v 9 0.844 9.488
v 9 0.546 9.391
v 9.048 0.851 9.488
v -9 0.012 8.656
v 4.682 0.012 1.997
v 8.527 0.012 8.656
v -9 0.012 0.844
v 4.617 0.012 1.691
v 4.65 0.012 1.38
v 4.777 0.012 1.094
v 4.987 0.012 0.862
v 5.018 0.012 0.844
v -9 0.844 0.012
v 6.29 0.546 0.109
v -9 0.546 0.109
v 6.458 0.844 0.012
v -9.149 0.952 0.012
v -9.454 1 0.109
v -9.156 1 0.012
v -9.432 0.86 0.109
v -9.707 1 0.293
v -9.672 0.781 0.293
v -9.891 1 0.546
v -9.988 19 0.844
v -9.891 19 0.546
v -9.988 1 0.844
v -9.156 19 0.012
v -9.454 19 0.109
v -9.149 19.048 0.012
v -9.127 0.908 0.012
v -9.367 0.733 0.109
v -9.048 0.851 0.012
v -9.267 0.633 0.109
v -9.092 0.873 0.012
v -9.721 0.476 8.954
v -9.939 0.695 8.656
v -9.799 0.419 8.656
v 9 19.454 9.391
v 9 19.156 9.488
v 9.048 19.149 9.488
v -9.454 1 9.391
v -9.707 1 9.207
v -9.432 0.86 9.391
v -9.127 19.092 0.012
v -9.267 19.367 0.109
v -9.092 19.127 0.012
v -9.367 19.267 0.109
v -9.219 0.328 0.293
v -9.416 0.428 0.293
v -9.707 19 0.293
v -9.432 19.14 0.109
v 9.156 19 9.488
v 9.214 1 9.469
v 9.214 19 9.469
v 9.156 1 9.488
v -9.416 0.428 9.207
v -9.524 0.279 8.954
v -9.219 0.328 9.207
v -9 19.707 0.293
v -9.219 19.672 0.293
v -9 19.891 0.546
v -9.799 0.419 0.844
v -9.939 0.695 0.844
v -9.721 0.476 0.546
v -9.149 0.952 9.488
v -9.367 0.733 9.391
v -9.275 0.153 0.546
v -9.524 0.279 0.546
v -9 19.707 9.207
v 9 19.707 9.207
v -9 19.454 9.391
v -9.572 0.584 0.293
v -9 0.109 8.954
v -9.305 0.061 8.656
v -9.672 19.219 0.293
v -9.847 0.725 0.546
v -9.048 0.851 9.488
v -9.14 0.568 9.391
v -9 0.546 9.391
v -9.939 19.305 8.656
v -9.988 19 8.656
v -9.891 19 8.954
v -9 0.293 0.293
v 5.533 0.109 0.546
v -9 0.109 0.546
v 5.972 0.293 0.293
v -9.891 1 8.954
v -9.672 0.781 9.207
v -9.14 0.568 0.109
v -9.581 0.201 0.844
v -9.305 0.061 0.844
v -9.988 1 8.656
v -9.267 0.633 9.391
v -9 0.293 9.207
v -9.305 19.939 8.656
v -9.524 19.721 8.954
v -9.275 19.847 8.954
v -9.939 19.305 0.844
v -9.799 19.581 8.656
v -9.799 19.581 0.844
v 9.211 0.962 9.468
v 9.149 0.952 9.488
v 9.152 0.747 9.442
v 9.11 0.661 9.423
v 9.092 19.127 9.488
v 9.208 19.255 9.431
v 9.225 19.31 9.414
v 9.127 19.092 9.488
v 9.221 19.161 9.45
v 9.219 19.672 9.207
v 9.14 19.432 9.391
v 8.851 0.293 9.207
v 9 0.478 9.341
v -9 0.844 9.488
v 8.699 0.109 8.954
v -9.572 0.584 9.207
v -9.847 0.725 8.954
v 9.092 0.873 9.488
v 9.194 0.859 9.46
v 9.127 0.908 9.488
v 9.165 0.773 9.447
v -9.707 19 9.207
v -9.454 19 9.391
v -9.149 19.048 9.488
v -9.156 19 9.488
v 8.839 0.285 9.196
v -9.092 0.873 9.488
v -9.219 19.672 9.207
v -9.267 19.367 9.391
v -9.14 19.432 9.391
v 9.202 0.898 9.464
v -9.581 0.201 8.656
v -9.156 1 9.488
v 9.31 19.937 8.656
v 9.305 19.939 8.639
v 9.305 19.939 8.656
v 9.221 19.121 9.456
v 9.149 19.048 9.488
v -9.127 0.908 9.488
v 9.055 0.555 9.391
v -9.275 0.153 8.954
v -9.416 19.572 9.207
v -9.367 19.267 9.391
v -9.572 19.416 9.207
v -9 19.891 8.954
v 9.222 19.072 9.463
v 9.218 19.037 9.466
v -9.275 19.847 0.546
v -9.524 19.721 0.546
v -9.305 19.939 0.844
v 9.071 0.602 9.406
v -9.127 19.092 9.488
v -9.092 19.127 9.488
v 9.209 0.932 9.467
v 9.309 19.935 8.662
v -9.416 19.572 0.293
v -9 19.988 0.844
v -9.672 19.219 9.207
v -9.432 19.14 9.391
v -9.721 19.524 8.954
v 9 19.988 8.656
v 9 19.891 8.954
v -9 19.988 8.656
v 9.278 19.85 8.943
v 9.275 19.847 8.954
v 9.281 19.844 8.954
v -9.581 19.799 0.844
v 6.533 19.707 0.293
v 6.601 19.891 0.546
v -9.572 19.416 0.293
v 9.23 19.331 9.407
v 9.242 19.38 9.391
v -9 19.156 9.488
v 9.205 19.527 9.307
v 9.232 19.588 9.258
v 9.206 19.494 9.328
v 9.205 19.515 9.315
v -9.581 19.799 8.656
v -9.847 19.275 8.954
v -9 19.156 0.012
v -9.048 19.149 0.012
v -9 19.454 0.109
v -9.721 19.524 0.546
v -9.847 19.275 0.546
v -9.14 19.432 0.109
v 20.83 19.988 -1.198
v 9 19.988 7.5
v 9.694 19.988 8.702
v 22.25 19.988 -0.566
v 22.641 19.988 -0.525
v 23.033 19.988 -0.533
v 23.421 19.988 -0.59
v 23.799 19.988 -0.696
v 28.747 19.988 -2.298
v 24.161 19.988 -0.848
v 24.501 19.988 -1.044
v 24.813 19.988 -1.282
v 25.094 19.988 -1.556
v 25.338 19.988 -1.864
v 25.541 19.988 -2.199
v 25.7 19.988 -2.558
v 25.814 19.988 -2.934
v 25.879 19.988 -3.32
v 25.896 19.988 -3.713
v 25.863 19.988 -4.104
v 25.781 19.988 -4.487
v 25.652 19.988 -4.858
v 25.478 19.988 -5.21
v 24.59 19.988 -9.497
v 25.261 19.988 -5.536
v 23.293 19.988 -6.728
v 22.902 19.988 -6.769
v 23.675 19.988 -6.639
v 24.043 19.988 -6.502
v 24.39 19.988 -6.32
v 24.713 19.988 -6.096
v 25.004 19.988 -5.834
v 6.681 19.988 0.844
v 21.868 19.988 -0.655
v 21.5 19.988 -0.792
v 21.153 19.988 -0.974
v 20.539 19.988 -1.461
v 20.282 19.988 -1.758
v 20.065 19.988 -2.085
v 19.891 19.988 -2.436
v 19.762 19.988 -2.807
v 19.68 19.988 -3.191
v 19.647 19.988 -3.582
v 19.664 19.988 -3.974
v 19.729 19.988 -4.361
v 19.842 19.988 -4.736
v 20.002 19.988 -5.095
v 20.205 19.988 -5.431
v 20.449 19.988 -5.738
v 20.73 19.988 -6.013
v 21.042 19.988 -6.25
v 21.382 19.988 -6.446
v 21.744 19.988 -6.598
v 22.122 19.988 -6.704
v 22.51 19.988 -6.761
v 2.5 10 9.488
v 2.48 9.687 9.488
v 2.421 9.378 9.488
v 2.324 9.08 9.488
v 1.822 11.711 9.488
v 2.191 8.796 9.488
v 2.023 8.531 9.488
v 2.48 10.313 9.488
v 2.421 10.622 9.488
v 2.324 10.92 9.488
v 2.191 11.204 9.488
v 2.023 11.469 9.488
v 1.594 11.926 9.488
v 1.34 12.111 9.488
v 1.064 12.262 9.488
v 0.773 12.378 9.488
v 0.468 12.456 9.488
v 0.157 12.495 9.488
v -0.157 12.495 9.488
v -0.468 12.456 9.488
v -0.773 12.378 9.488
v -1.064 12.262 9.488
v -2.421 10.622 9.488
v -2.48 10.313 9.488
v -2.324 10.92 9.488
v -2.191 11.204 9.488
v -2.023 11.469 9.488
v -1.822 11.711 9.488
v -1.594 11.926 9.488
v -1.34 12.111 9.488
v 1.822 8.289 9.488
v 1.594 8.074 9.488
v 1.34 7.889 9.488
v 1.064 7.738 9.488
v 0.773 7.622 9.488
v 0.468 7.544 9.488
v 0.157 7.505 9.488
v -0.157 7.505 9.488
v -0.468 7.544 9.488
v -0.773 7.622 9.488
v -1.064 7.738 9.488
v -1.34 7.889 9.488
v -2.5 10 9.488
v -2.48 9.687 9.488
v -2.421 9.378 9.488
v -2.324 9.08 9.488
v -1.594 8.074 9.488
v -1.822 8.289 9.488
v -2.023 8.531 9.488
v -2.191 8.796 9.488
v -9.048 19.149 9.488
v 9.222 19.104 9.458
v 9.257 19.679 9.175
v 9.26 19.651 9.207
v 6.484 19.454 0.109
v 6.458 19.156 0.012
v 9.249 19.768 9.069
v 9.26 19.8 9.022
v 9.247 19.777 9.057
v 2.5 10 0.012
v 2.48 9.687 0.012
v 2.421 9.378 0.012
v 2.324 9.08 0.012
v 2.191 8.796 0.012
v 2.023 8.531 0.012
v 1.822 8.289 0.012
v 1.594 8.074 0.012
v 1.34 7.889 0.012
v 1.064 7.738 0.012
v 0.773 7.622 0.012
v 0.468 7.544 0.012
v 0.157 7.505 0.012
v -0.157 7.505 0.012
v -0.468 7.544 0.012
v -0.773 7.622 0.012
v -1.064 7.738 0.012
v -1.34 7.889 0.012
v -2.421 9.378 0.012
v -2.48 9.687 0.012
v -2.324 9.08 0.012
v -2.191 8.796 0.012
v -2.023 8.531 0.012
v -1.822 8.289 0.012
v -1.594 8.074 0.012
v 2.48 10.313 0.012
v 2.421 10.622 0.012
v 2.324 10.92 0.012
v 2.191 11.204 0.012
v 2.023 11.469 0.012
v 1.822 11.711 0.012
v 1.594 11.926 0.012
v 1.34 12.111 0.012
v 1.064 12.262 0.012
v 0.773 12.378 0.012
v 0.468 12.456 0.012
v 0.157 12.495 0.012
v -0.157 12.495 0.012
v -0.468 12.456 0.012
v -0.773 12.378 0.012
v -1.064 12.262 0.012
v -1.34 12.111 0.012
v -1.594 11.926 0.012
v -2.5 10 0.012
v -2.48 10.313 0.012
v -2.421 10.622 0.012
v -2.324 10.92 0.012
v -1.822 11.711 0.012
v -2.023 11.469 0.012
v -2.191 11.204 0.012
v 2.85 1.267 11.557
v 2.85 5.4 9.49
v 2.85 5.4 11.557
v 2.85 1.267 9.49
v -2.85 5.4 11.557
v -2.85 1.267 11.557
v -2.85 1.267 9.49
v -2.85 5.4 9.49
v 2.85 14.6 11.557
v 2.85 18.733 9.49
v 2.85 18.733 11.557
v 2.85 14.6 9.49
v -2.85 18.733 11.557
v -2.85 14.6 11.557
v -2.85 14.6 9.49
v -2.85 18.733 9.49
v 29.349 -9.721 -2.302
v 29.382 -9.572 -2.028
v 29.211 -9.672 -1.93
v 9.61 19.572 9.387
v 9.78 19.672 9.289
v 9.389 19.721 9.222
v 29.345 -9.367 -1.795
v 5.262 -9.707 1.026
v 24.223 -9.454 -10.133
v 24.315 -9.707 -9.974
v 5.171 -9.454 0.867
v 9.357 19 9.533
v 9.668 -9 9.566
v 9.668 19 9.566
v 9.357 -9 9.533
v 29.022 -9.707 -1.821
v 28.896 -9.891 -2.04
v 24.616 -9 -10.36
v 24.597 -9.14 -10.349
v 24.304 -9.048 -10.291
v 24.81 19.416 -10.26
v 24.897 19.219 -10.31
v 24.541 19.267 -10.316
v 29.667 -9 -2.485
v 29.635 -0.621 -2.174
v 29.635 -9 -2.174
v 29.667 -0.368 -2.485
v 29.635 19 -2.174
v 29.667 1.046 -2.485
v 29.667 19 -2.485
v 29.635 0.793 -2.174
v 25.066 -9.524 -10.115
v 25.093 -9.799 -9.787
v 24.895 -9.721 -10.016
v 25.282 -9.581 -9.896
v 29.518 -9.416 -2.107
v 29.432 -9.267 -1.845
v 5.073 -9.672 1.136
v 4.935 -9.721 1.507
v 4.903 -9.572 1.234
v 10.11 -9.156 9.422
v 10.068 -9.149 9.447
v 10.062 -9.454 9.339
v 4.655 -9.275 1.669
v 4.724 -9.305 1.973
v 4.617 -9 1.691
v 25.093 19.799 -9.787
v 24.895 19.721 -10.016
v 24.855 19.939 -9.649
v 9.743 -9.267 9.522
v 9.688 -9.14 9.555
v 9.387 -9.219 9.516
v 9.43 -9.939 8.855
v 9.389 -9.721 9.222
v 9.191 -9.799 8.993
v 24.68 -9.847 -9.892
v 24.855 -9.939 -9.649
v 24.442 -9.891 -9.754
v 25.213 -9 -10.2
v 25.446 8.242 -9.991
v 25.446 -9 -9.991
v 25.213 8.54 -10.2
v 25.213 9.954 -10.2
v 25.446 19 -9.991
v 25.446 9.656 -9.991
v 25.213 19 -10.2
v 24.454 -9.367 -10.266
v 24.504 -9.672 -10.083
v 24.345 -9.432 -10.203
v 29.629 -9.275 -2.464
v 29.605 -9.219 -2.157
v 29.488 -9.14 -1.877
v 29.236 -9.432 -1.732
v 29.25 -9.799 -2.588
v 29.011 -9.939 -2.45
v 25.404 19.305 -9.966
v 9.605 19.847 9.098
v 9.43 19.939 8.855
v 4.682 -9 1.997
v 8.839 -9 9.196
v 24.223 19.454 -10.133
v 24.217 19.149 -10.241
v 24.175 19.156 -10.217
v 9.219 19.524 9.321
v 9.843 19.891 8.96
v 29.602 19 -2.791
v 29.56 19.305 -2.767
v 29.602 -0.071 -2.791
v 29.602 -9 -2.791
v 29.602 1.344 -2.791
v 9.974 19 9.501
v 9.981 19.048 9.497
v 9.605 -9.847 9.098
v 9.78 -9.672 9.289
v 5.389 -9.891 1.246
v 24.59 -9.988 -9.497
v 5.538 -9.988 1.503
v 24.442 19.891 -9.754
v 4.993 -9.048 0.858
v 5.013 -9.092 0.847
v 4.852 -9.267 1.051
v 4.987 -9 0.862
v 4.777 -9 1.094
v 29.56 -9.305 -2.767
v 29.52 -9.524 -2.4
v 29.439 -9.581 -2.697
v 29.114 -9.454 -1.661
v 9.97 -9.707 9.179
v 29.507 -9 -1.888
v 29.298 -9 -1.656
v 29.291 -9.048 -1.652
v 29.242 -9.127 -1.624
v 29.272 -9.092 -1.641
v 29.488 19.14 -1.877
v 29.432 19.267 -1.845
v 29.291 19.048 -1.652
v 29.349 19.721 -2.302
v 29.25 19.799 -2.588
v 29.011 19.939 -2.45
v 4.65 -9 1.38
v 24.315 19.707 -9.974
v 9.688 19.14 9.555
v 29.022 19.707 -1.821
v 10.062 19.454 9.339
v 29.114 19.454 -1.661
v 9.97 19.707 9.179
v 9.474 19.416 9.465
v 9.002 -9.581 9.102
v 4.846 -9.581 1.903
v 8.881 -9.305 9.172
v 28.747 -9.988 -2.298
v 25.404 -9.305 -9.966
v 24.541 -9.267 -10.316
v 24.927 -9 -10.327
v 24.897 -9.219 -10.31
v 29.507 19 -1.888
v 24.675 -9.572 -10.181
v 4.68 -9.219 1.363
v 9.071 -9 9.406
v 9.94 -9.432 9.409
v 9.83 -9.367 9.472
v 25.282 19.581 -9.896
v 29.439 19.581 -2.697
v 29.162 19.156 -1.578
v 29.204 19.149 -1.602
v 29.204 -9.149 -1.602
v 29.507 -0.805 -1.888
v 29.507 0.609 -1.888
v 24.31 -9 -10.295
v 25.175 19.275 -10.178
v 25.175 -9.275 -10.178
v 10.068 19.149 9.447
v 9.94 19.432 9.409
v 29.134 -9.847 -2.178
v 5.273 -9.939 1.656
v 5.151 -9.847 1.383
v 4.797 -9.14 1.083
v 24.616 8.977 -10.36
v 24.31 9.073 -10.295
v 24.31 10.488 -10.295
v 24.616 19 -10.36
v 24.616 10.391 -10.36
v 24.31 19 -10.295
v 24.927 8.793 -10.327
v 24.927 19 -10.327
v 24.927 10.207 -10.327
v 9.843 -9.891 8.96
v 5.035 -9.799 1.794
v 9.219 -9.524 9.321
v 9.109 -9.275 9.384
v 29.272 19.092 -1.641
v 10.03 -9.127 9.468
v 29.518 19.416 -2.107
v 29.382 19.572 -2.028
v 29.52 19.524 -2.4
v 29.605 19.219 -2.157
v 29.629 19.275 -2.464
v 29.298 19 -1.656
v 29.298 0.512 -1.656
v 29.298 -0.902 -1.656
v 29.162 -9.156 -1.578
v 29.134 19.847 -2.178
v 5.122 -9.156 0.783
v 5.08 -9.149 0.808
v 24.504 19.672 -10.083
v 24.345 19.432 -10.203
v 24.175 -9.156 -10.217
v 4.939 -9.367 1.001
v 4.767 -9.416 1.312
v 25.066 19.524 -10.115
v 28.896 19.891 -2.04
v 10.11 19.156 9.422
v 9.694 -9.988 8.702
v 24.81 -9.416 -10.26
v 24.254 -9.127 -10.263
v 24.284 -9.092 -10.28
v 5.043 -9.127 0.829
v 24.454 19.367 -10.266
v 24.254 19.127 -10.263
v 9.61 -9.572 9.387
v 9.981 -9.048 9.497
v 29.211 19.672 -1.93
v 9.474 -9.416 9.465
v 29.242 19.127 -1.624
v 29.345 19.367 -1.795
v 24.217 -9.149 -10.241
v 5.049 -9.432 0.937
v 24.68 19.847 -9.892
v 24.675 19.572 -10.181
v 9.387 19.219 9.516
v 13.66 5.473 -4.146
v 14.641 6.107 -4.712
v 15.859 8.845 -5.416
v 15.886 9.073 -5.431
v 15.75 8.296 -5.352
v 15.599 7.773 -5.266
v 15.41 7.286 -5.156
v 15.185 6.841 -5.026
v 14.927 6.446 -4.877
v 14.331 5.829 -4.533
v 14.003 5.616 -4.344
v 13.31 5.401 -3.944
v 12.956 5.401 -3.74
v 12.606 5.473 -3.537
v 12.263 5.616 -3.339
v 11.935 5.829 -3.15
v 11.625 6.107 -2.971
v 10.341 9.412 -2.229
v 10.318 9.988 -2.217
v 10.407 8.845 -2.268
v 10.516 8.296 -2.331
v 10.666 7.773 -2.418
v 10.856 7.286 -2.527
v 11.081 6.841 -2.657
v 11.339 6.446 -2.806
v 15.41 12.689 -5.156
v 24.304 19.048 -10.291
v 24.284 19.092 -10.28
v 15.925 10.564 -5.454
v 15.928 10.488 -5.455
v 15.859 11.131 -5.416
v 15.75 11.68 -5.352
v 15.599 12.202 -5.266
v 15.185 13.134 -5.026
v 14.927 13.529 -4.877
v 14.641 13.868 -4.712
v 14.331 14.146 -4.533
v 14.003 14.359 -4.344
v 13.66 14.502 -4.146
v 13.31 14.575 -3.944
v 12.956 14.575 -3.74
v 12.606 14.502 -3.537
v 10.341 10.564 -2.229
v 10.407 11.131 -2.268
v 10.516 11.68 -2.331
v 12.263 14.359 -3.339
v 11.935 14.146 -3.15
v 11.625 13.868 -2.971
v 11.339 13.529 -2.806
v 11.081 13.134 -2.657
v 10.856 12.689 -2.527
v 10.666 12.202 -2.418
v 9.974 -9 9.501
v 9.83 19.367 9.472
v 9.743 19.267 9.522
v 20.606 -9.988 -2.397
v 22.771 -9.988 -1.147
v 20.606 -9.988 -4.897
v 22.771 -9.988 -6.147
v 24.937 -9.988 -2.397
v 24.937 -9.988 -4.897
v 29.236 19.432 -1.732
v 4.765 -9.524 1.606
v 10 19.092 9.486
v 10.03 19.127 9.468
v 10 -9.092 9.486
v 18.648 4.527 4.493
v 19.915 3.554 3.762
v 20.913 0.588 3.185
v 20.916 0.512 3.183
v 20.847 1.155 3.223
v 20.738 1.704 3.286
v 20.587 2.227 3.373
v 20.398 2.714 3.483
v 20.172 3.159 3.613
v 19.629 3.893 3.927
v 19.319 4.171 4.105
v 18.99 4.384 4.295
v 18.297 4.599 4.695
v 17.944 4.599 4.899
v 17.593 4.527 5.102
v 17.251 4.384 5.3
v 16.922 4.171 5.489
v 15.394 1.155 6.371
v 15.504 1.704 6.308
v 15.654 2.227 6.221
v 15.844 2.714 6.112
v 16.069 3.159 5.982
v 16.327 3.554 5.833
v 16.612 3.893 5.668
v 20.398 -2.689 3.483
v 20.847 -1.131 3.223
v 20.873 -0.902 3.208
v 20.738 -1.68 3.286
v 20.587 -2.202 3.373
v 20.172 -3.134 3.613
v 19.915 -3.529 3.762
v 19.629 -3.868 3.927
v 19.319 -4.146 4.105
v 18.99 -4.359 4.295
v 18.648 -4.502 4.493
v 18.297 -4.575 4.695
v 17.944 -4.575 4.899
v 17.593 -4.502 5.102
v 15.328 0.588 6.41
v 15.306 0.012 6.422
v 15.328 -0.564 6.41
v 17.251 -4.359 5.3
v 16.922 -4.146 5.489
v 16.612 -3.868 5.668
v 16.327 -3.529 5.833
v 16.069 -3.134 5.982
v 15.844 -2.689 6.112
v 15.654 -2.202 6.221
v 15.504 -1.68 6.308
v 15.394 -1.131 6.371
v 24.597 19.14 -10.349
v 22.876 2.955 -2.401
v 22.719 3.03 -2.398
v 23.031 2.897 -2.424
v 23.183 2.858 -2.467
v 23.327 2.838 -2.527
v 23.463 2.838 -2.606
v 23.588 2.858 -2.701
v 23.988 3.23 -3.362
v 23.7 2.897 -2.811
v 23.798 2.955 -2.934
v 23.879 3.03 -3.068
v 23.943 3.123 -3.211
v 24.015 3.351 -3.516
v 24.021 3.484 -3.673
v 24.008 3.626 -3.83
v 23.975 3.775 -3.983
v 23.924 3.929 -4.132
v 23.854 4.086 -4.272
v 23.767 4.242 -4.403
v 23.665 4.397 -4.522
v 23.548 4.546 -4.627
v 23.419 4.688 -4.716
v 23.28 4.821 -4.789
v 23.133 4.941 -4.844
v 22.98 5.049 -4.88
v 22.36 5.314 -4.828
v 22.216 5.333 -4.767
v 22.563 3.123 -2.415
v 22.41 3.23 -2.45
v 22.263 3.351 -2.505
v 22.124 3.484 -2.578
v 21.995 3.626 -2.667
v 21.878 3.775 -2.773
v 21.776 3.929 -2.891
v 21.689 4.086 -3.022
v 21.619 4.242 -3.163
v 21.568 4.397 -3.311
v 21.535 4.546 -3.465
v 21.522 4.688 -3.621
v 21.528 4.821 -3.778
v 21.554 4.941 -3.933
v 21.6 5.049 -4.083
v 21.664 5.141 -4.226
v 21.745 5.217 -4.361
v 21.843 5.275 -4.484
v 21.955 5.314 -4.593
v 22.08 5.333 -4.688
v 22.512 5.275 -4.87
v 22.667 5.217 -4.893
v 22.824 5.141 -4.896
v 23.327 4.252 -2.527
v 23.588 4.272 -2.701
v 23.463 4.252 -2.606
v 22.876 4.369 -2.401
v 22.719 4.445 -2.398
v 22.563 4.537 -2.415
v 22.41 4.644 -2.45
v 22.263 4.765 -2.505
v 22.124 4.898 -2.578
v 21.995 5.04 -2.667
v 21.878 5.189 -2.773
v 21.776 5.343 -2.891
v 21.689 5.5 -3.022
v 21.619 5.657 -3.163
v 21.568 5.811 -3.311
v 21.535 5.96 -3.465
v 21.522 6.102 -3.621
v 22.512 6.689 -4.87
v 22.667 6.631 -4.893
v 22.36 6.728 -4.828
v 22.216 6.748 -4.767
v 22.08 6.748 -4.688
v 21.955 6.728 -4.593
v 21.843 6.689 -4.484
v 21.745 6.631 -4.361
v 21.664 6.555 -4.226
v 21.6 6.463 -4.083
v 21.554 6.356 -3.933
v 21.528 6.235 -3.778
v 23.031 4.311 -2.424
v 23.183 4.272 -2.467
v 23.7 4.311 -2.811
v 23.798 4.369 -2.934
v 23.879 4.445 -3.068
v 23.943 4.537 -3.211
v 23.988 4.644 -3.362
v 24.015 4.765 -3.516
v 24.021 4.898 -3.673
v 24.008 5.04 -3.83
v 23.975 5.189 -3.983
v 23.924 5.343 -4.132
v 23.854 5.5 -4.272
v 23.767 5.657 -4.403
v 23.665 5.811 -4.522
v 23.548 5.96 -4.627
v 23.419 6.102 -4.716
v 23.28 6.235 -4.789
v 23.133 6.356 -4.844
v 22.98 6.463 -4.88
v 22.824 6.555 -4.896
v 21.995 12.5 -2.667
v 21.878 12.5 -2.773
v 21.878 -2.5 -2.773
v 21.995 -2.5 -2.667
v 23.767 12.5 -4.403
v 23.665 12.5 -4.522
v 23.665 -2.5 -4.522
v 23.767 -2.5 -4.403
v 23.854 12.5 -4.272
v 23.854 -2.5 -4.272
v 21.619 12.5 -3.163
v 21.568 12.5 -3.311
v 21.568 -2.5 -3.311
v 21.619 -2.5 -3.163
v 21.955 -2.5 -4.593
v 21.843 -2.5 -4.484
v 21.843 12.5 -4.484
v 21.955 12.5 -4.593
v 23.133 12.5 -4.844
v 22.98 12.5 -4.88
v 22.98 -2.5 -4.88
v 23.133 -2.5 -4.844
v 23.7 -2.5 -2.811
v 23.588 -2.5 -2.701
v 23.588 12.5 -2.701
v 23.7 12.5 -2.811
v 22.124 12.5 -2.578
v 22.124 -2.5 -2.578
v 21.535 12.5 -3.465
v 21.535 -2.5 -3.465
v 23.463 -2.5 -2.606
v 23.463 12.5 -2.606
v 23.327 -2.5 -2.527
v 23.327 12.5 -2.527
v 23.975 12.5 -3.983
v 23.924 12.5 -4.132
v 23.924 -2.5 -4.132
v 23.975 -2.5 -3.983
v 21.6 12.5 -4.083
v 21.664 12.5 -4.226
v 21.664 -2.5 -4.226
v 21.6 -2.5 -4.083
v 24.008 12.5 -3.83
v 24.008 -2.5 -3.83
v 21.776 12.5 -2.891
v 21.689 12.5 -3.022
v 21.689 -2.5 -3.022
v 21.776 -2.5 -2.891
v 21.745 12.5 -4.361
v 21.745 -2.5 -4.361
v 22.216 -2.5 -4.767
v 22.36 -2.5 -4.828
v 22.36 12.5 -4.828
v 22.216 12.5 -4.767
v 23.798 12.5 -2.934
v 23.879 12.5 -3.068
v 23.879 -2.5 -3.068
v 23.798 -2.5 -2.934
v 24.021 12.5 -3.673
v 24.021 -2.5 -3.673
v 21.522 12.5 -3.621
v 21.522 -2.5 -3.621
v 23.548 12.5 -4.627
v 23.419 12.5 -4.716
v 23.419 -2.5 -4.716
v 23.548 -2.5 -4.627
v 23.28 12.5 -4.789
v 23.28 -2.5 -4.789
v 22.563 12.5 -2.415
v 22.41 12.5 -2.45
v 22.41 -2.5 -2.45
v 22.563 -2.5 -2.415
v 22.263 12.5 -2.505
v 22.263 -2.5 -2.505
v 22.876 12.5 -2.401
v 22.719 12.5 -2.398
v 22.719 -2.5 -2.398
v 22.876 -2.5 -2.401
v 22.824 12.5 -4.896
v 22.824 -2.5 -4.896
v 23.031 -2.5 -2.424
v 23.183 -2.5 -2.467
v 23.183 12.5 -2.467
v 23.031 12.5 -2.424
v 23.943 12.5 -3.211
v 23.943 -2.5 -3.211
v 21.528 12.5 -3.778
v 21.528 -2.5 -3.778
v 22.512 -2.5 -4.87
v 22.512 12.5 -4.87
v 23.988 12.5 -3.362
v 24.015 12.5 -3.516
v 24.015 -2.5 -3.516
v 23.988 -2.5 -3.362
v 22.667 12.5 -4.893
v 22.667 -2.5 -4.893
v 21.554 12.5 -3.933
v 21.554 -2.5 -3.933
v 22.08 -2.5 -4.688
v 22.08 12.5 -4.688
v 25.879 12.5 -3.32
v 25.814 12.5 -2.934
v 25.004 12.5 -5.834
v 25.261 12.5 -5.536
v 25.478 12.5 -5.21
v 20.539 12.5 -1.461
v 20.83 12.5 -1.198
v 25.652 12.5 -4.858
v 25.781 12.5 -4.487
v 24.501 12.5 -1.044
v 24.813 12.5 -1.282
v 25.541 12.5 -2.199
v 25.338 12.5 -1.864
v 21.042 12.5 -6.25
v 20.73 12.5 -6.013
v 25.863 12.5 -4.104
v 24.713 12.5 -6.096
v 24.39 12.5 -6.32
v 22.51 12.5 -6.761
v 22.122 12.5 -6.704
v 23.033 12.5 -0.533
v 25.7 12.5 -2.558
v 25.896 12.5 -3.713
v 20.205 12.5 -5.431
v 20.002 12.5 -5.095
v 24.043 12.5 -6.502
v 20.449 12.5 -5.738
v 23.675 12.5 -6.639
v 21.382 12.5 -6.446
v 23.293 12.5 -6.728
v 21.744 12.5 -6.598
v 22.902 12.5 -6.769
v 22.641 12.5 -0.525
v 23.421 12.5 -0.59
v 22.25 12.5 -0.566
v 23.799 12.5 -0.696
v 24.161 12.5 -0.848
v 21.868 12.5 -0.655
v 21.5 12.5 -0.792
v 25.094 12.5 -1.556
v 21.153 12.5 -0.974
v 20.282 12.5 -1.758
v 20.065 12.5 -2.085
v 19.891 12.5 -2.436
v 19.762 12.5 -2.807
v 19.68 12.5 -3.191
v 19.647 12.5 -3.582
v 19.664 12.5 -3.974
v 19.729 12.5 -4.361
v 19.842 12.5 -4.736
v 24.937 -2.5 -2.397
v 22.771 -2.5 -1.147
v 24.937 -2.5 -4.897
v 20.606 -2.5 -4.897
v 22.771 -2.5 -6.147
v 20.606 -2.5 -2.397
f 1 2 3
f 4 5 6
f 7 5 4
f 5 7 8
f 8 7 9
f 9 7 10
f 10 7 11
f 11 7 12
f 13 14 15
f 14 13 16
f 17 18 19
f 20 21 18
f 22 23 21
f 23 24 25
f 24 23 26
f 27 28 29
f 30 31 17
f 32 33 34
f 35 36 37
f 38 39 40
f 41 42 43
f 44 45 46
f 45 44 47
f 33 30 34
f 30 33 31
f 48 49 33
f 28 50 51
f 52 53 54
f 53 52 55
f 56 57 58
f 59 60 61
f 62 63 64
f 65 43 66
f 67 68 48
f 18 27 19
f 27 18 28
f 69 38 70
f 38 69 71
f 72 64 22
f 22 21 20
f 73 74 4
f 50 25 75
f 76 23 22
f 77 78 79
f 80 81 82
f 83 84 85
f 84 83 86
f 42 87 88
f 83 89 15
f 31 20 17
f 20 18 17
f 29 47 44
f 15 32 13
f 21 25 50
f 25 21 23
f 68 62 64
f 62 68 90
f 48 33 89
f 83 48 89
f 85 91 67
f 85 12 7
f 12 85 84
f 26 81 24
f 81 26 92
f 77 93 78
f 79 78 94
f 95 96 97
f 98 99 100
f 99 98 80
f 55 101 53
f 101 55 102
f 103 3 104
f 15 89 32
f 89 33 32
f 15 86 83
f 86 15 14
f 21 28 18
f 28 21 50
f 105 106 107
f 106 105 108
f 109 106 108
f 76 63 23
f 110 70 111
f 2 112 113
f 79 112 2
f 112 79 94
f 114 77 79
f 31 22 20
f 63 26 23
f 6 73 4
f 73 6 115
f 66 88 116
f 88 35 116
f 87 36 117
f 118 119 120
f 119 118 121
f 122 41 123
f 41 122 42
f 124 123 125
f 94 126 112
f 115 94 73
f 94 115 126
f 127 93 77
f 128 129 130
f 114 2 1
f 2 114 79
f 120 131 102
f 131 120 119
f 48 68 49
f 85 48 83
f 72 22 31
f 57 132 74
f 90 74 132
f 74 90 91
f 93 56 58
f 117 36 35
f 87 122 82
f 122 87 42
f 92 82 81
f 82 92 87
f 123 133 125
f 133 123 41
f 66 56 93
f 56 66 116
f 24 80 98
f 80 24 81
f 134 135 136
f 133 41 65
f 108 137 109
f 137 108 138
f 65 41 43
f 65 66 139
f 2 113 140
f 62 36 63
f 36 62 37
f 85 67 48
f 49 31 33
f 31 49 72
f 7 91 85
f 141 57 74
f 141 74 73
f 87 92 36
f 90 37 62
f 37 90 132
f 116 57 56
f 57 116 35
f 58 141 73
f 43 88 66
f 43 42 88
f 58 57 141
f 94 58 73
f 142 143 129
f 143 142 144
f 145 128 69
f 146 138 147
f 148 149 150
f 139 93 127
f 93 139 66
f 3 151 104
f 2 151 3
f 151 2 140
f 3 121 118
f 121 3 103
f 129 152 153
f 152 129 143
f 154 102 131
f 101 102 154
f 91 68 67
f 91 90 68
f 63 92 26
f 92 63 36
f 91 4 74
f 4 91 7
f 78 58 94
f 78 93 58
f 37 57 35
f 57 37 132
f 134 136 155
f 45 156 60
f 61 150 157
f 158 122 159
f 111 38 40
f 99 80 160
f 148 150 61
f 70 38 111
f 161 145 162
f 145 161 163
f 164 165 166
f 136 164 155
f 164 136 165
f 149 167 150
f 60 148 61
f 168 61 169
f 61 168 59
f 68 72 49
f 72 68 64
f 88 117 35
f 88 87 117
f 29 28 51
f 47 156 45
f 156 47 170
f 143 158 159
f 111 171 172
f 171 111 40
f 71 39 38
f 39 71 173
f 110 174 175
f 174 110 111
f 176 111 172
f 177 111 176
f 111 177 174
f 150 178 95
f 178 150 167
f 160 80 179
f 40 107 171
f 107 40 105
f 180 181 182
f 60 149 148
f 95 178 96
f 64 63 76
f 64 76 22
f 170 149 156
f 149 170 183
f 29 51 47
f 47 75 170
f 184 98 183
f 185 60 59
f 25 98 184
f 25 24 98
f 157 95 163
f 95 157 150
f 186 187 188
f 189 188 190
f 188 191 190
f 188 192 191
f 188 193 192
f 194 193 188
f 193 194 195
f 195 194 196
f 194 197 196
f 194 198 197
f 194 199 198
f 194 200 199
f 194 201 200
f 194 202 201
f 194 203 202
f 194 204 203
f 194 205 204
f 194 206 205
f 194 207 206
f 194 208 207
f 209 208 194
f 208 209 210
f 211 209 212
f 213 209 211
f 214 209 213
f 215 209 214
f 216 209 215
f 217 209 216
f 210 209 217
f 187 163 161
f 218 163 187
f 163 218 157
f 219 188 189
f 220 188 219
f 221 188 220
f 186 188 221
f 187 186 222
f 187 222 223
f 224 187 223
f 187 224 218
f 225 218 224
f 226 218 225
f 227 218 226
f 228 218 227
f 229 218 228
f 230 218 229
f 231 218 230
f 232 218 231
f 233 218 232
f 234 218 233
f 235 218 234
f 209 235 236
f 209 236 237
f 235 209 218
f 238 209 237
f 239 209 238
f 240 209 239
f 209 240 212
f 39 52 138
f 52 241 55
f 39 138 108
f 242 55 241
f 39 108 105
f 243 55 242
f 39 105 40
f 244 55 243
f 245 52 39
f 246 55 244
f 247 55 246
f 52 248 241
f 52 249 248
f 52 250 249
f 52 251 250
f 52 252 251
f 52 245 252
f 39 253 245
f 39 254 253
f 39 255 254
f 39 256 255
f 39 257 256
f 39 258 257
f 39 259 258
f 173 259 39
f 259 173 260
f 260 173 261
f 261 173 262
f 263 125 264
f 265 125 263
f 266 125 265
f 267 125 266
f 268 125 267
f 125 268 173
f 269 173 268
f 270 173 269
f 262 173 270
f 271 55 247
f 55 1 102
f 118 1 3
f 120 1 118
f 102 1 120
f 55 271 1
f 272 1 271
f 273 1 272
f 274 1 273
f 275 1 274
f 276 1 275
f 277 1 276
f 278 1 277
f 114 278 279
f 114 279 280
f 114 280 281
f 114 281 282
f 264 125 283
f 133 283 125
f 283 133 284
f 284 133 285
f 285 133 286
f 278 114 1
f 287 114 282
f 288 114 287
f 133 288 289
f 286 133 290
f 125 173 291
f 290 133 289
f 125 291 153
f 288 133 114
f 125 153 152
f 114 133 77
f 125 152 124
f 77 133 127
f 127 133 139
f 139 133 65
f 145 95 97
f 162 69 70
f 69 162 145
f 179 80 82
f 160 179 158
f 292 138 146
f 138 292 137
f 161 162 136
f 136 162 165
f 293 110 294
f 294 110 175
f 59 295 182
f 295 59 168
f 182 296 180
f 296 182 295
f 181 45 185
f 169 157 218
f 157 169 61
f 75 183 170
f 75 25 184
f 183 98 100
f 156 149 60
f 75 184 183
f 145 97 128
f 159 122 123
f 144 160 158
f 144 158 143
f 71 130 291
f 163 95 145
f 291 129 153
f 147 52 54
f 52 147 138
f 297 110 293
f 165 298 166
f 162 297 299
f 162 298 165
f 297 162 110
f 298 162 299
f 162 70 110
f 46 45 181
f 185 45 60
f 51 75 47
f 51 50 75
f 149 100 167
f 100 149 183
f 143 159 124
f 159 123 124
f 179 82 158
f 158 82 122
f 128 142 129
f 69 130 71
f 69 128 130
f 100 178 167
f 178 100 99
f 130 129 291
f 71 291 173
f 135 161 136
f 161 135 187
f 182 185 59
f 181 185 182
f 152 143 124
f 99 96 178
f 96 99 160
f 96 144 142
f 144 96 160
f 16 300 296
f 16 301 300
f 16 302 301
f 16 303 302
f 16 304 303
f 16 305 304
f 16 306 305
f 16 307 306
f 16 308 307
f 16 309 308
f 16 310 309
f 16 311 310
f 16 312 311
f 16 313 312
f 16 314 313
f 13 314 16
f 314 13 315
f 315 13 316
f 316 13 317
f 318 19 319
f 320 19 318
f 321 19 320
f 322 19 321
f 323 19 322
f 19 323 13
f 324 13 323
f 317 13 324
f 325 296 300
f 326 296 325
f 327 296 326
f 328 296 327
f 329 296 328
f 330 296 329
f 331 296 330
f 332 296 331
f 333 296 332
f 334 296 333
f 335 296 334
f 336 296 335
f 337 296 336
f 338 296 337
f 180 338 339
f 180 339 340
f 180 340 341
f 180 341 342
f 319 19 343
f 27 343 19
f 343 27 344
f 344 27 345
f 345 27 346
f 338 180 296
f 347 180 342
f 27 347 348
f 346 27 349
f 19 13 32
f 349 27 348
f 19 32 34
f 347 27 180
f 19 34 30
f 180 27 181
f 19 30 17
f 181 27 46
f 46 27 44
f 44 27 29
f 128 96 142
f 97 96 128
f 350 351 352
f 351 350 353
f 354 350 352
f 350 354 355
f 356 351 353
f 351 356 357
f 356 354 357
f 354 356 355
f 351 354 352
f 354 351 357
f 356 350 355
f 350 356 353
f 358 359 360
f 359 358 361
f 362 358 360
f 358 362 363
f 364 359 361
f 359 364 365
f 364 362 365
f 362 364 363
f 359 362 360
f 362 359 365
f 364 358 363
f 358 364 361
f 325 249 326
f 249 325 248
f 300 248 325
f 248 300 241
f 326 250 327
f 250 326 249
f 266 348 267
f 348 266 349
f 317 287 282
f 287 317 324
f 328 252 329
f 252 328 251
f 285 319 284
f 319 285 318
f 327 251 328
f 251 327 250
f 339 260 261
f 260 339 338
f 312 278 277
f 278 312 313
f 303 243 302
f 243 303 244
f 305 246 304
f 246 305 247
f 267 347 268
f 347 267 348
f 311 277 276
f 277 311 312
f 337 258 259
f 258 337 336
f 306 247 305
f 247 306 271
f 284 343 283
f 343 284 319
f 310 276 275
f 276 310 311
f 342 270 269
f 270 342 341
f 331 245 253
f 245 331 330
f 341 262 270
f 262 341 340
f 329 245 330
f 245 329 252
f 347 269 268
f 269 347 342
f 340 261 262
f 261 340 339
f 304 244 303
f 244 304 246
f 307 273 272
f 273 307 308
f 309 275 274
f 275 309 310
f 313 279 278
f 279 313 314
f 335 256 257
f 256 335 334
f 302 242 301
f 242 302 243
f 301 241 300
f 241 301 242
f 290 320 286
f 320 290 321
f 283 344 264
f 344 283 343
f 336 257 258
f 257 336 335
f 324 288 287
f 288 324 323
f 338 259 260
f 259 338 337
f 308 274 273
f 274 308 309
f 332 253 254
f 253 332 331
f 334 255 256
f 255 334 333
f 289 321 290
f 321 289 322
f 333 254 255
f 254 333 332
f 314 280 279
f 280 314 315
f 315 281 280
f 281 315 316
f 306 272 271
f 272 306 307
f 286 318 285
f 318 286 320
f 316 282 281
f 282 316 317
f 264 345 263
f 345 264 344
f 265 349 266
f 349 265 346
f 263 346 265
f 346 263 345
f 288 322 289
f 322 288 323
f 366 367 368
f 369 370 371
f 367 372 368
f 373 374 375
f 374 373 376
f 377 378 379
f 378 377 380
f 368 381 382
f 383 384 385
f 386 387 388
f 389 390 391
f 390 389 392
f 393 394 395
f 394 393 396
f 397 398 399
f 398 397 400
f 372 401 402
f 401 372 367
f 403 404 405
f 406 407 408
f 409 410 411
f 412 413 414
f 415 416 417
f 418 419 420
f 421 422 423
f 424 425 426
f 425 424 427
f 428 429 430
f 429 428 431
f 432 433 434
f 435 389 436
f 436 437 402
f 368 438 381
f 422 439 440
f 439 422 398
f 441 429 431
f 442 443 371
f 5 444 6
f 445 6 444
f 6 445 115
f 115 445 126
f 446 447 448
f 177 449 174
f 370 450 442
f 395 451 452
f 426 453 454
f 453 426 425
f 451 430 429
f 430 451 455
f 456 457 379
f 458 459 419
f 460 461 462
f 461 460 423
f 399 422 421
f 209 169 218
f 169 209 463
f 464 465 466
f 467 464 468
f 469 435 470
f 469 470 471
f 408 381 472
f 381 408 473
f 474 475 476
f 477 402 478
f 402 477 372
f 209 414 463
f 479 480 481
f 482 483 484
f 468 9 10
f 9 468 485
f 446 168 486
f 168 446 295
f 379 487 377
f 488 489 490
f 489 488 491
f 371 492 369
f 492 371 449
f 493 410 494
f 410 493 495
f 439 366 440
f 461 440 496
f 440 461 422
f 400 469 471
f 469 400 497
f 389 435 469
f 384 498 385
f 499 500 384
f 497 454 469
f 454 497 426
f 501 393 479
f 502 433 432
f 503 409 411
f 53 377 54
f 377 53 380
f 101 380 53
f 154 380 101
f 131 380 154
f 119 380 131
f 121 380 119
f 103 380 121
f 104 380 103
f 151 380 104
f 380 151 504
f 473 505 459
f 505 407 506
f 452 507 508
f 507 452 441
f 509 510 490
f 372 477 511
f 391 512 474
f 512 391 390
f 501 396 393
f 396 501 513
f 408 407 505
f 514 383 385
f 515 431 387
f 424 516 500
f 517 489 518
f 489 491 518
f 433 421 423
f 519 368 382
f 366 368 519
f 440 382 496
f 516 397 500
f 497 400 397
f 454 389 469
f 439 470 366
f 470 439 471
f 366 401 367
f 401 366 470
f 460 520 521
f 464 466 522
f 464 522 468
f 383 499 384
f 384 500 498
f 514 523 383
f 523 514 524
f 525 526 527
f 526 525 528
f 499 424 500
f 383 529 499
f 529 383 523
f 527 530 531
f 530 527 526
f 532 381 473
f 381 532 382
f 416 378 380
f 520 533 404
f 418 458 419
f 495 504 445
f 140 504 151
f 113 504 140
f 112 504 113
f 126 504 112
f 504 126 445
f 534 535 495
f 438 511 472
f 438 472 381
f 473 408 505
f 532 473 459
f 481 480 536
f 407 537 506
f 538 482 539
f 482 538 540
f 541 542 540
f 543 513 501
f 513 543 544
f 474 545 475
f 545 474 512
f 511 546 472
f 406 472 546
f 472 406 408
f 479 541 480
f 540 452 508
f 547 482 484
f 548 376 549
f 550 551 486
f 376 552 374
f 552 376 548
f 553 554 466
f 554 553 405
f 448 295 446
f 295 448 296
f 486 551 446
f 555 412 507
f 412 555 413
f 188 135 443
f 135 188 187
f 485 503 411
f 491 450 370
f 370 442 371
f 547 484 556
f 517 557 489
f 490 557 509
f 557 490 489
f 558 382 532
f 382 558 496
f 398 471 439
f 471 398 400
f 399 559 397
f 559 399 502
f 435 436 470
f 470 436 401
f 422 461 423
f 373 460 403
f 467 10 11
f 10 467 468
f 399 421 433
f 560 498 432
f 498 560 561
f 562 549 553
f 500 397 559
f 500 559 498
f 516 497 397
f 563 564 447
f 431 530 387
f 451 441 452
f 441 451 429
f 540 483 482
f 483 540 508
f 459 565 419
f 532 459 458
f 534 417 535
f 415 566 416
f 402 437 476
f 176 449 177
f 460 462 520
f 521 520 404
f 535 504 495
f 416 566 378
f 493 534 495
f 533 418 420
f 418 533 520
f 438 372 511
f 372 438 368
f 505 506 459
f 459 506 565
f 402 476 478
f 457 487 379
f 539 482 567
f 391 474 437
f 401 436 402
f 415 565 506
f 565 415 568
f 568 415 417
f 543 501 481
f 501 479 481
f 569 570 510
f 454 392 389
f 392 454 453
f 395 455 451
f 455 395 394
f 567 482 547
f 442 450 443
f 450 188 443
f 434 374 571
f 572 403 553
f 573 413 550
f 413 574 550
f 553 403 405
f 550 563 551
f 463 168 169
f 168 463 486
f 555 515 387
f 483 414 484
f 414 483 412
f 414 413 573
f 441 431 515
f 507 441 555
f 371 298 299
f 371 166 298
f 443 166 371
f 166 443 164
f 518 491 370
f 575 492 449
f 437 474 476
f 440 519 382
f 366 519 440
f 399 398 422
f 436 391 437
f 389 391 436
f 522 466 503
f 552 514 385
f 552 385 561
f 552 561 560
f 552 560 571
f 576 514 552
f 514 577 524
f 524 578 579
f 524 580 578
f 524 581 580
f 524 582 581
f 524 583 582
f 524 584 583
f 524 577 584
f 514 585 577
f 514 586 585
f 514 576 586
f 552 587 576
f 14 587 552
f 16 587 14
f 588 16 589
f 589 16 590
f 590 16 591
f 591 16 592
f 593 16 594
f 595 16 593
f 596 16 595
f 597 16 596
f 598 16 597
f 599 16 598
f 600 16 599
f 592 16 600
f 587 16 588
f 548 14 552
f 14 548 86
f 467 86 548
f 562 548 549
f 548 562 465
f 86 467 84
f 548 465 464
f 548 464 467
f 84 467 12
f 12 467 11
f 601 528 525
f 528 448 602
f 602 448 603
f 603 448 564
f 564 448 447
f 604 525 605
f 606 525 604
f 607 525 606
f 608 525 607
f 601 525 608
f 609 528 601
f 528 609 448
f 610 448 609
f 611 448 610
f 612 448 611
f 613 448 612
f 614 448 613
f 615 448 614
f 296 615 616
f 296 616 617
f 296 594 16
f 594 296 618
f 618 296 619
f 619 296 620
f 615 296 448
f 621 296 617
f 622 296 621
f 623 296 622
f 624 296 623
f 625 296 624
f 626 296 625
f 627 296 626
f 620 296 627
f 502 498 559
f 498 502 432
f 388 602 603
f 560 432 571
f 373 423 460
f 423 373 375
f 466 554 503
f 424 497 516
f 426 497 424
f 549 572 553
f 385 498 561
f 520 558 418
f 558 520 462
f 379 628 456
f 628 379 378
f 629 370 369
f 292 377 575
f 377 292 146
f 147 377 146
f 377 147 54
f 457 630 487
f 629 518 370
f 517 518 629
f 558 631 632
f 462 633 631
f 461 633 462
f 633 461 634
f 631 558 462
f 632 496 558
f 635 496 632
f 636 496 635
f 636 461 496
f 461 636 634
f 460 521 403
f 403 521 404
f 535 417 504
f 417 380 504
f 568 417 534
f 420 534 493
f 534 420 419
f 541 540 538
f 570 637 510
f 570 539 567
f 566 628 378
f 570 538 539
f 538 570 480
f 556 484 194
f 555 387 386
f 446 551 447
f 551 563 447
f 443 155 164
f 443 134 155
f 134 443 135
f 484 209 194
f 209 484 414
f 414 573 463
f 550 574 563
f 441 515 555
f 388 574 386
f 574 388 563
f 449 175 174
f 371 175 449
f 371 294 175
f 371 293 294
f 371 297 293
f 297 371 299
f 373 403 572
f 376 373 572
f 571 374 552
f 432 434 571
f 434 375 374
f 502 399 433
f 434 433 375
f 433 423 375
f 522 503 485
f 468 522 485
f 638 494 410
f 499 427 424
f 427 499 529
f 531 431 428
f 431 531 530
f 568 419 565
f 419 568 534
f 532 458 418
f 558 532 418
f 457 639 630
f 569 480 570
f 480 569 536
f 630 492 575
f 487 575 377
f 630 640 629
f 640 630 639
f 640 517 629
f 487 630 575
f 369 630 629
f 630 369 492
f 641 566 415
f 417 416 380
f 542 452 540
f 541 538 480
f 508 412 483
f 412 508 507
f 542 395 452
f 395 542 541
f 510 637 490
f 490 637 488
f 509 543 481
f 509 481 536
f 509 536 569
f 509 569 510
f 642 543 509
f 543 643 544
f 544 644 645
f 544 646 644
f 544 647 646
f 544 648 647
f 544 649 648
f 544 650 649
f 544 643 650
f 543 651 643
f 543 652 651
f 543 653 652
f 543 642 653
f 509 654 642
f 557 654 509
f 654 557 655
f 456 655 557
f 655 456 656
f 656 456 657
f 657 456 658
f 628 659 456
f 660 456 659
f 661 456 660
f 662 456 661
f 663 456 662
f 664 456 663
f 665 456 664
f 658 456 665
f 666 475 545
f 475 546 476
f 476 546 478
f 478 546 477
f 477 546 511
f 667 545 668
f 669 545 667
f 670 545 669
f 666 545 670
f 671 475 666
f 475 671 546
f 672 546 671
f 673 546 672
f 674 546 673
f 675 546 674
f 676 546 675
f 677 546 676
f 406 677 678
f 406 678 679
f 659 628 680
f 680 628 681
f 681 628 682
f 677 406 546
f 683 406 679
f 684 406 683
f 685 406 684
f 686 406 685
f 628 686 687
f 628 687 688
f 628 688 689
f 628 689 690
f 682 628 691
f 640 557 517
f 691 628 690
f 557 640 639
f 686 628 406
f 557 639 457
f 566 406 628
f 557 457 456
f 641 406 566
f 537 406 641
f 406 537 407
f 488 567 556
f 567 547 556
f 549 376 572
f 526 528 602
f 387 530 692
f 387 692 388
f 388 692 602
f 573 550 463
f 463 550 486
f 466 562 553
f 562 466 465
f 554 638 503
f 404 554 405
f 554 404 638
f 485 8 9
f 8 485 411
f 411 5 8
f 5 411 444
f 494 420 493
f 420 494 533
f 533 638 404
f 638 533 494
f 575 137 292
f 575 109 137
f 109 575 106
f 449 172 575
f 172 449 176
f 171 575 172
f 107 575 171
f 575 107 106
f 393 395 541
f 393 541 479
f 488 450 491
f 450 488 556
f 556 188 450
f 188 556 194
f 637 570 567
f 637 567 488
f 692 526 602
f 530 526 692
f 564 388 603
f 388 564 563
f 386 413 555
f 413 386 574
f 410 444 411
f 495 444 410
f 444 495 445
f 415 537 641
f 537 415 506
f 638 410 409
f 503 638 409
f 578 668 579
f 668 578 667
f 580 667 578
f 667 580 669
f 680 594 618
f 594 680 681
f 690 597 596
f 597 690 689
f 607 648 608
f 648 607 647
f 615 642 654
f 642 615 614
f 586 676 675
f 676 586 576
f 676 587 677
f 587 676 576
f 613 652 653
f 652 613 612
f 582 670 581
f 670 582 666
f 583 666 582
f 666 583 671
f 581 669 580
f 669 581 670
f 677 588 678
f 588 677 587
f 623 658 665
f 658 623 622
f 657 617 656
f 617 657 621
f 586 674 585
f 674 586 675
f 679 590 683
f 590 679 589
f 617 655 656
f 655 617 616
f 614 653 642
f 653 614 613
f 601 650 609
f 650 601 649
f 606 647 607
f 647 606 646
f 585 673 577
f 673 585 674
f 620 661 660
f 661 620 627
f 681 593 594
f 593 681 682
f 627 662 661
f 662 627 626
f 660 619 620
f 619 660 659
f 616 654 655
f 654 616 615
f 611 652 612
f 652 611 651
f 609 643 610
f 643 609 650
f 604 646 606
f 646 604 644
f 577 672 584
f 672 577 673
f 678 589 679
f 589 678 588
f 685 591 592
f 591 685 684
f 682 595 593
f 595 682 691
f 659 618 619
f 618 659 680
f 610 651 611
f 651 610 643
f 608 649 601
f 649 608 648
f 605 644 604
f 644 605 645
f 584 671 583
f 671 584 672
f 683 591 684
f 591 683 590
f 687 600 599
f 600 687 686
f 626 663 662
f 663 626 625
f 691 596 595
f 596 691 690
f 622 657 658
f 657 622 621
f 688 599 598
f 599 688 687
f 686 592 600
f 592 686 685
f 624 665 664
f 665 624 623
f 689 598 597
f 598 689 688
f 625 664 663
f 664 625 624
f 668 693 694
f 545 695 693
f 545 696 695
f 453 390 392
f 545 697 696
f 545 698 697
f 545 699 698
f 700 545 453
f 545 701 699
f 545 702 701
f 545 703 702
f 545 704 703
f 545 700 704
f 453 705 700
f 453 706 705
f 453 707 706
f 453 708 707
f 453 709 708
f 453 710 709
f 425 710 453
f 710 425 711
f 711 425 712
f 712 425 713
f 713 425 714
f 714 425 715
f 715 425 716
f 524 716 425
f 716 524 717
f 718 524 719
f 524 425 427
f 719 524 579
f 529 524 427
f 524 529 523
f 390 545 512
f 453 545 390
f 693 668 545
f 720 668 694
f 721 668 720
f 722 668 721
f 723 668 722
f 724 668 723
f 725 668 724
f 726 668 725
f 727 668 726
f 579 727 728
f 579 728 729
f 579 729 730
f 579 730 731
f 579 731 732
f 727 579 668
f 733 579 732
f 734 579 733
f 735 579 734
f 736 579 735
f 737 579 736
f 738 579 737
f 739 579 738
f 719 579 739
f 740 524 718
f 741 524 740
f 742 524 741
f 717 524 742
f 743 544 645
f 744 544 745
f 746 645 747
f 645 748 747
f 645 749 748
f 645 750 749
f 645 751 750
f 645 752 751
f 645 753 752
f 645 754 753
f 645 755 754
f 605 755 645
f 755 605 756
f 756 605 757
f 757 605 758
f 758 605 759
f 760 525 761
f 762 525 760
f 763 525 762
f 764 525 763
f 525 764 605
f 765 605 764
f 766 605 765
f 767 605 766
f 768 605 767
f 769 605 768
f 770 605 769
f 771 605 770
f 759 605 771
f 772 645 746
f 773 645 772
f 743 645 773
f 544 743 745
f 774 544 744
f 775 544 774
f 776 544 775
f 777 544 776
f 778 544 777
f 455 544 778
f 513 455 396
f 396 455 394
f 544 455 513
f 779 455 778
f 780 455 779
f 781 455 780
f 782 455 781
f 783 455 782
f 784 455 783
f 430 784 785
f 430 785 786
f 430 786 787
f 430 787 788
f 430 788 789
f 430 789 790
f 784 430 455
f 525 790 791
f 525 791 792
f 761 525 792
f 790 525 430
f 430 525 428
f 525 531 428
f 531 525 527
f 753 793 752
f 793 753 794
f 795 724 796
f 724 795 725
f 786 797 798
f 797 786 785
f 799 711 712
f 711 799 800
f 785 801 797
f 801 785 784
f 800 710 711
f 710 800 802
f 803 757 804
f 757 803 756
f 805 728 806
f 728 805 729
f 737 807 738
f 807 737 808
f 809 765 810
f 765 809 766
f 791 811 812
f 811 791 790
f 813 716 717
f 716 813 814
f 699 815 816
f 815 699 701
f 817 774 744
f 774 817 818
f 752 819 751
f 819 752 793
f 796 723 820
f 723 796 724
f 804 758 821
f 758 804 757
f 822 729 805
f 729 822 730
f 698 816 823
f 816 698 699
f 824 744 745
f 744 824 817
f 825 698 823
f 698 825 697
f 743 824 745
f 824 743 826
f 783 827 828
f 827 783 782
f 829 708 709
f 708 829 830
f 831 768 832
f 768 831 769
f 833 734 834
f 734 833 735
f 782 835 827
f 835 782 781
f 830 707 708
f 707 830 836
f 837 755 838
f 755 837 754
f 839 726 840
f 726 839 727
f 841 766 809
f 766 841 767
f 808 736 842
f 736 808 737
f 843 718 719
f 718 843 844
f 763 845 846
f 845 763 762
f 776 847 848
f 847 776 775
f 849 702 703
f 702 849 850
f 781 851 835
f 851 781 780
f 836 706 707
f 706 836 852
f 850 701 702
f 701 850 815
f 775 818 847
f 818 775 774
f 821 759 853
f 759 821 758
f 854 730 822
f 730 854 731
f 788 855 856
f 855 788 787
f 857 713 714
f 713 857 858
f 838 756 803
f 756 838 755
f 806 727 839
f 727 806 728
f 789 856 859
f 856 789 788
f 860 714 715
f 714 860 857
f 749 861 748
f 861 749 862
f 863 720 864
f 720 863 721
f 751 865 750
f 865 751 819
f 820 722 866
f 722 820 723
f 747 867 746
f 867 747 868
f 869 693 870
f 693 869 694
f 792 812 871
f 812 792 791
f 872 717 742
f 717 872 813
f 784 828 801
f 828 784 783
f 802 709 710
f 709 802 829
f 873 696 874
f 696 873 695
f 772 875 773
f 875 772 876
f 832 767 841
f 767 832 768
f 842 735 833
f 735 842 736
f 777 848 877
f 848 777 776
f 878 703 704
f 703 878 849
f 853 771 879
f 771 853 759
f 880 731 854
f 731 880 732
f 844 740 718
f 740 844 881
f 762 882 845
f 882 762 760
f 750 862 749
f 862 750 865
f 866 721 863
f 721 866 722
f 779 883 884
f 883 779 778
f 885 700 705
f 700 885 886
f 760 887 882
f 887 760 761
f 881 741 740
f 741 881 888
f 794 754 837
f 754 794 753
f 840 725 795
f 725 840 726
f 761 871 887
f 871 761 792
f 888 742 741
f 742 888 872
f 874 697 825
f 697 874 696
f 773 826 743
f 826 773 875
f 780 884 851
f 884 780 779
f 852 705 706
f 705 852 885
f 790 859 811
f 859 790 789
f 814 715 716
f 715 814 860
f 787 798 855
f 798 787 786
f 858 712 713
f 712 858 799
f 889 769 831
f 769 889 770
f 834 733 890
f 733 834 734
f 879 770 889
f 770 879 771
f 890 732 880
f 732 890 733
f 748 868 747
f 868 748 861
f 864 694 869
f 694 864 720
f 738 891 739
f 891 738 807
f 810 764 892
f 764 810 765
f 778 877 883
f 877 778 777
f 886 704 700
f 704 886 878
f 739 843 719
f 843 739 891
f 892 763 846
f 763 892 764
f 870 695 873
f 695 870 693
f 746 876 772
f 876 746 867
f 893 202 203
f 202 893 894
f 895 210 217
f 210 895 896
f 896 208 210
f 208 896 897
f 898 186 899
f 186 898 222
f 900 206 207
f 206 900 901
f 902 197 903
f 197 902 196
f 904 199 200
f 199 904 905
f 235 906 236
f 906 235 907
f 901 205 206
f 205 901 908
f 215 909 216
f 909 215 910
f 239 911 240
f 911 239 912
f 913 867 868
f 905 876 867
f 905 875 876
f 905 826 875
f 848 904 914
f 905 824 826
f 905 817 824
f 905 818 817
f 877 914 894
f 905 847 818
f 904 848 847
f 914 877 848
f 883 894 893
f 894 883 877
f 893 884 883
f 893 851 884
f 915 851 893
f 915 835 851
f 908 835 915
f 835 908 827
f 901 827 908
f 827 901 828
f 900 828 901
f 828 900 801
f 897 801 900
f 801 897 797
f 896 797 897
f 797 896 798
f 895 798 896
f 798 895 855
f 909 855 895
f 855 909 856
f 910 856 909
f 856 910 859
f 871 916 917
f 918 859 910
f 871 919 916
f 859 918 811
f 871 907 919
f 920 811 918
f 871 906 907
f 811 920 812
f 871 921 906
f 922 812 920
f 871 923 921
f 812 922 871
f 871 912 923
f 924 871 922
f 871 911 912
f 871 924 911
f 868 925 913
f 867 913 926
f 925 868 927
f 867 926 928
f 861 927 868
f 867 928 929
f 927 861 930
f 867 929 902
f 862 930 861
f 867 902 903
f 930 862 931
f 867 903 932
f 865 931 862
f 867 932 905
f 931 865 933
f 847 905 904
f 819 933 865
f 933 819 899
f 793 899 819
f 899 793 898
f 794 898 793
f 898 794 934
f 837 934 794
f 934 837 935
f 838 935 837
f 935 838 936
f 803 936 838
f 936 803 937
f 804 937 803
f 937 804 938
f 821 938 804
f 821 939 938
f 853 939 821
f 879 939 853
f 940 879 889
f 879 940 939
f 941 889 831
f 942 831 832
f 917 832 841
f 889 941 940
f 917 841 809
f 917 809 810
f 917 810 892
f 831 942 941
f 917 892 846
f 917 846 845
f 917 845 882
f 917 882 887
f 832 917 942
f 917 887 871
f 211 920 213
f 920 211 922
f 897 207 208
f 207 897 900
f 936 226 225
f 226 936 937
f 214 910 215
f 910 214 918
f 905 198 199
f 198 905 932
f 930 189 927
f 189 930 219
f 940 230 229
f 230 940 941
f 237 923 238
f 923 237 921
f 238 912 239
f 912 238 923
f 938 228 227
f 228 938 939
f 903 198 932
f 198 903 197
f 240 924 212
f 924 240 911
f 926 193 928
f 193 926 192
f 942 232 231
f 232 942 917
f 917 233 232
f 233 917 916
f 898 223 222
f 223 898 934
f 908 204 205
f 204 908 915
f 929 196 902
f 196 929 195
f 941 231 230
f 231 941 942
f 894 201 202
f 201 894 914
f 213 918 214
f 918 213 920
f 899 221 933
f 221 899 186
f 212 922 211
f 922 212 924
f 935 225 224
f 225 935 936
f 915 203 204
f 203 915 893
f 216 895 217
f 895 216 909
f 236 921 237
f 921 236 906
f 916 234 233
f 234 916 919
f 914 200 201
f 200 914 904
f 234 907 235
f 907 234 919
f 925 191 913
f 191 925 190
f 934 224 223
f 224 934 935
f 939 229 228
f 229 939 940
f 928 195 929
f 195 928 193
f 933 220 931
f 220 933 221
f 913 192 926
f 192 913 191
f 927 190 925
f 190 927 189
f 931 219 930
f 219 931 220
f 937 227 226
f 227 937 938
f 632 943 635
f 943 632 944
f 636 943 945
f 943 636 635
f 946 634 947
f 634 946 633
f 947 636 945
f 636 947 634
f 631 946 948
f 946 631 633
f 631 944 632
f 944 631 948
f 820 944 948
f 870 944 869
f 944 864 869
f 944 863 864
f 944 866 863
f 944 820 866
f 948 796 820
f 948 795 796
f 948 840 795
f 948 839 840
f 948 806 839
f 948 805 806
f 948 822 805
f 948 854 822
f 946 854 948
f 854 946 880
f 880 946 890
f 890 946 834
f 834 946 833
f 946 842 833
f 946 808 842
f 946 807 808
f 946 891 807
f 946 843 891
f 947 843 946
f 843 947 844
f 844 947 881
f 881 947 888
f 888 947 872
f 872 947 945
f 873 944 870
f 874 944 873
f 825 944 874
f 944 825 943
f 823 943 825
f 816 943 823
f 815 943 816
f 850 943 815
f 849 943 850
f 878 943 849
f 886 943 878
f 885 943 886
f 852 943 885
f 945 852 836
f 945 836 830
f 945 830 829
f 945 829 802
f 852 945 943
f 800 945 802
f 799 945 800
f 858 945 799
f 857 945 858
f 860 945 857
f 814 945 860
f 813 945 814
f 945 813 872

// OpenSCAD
// Attachment for CF rod to brace Kossel delta printer towers.

// Width of the aluminum extrusion beam
railWidth=20;

// Width of the slot in the aluminum extrusion beam
railSlotWidth=6.2;

attachBlockThickness=9.5+0;

railSlotInsertLength=railSlotWidth*2/3;
railSlotInsertDepth=railSlotWidth/3;

railSlotInsertClearance=0.25+0;

// Diameter of the bolt used to attach to the aluminum beam
railAttachScrewHoleDia=4;

railAttachScrewHoleTolerance=0.5;

// diameter of the bold used for clamping
rodClampScrewHoleDia=2.5;

railSlotInsertWidth=railSlotWidth-railSlotInsertClearance*2;

// Angle up/down from vertical for the brace rod
rodAngle=45;

// delta printer towers are arranged as equilateral triangles
// so this angle should be fixed.  Applied around y-axis
// in this model to angle in the rod clamp and align it
// parallel with one of the "side faces" of the printer.
//                  -----------------
//                     *  \  60
//                    * *  \
//    top view       *   *  \
//                  *     *  \ 
//                 * * * * *
//
// Note: If the rod starts out at 90, this needs to be
// 60-90 or -30
rodRailAlignmentAngle=-30+0; 

// Amount the clamp ears stick out past the rod
rodClampEarLength=11;

// Width of the slot that allows clamping around the rod.
rodClampEarGap=1;

// Diameter of the CF rod to be used
rodDia=6;

rodTolerance=0.25;

// Amount of material between the rod and the edge
rodClampInset=7;

// Top to bottom measurement for the rod clamp block
rodClampThickness=10;

// Radius of the corners on the block parts
smoothnessRadius=1;

rodClampWidth=rodClampInset*2+rodDia;
rodClampLength=rodClampInset+rodDia+rodClampEarLength;

/*
 * Move the top plate of the clamp over enough to match the angle
 * of the rod hole.
 * tan(angle) = opposite/adjacent --> tan(angle)*adjacent = opposite
 * so then it gets multiplied by the actual thickness of the block.
 *              |--------need this
 *              v
 *    -------- ---|- <--- this is rodClampThickness
 *    \        \  | 
 *     \        \*| <--- this is rodAngle (from vertical)
 *      \        \|
 *       ---------
 */
topSlopeTranslateY=tan(rodAngle)*rodClampThickness;

overlap=0.01+0;
$fn=50+0;

attachBlock();
// position
translate([railWidth/2-smoothnessRadius,railWidth/2-rodClampWidth/2,0])
// move back up after rotation to re-align bottom
translate([0,0,attachBlockThickness])
rotate([0,-rodRailAlignmentAngle,0])
// move down before rotation to align edge
translate([0,0,-attachBlockThickness])
// reposition after mirror
translate([0,+rodClampWidth,0])
mirror([0,1,0])
    rodClamp();

module rodClamp() {
    
    difference() {
        // fix minkowski shift across axes
        translate([smoothnessRadius, smoothnessRadius, smoothnessRadius])
        minkowski() {
            hull() {
                cube([rodClampLength-smoothnessRadius*2, 
                    rodClampWidth-smoothnessRadius*2,
                    rodClampThickness-smoothnessRadius*2]);
                translate([0, topSlopeTranslateY,0])
                    cube([rodClampLength-smoothnessRadius*2, 
                        rodClampWidth-smoothnessRadius*2,
                        rodClampThickness-smoothnessRadius*2]);
            }
            sphere(r=smoothnessRadius, $fn=20);
        }
        // rod hole
        actualRodDia=rodDia+rodTolerance*2;
        translate([rodClampInset+actualRodDia/2,rodClampWidth/2,0]) // position
            rotate([-rodAngle,0,0]) // slant
            translate([0,0,-rodClampThickness*3]) // shift to fully cut block
                cylinder(d=actualRodDia, h=rodClampThickness*6);
        // slot
        translate([rodClampInset+rodDia,
            rodClampWidth/2-rodClampEarGap/2,0]) // position
            rotate([-rodAngle,0,0]) // slant
            // shift to fully cut block
            translate([-rodClampEarLength/2,0,-rodClampThickness*3]) 
                cube([rodClampEarLength*2, rodClampEarGap,
                    rodClampThickness*6]);
        // screw hole
        translate([rodClampInset+rodDia+rodClampEarLength/2,
            0,rodClampThickness/2])
        rotate([-90,0,0])
        translate([0,0,-rodClampWidth*3])
        cylinder(d=rodClampScrewHoleDia, h=rodClampWidth*6);
        
        // Note: countersink amount calculated by a ratio of
        // the rod angle and then limited by a little less than
        // half of the total width less half the slot gap to 
        // prevent cutting into the slot gap.
        counterSinkAmount = min(topSlopeTranslateY*(rodAngle/60),
                rodClampWidth*0.45-rodClampEarGap/2);

        // Cut flat round countersink for screw head
        translate([rodClampInset+rodDia+rodClampEarLength/2,
            counterSinkAmount,
            rodClampThickness/2])
        rotate([-90,0,0])
        translate([0,0,-rodClampWidth]) // start below z-axis
        cylinder(d=rodClampScrewHoleDia*2.5, h=rodClampWidth);
        
        // Cut flat hex countersink for nut
        translate([rodClampInset+rodDia+rodClampEarLength/2,
            rodClampWidth+topSlopeTranslateY-counterSinkAmount,
            rodClampThickness/2])
        rotate([-90,0,0])
        cylinder(d=rodClampScrewHoleDia*2, h=rodClampWidth, $fn=6);
    }
}


module attachBlock() {
    difference() {
        union() {
            // main block
            translate([-railWidth/2,0,0])
            // fix minkowski shift across axes
            translate([smoothnessRadius, smoothnessRadius, smoothnessRadius])
            minkowski() {
                cube([railWidth-smoothnessRadius*2, 
                    railWidth-smoothnessRadius*2, 
                    attachBlockThickness-smoothnessRadius*2]);
                sphere(r=smoothnessRadius, $fn=20);
            }

            // insert tab 1
            railSlotInsertPosition1 = railWidth/6-railSlotInsertLength/2;
            translate([-railSlotInsertWidth/2,railSlotInsertPosition1,
                attachBlockThickness-overlap])
            cube([railSlotInsertWidth, railSlotInsertLength,
                railSlotInsertDepth]);

            // insert tab 2    
            railSlotInsertPosition2 = railWidth*5/6-railSlotInsertLength/2;
            translate([-railSlotInsertWidth/2,railSlotInsertPosition2,
                attachBlockThickness-overlap])
            cube([railSlotInsertWidth, railSlotInsertLength,
                railSlotInsertDepth]);    
        }
        // bolt hole
        translate([0,railWidth/2,-overlap])
            cylinder(d=railAttachScrewHoleDia+railAttachScrewHoleTolerance*2, 
                h=attachBlockThickness+overlap*2);
    }
}
